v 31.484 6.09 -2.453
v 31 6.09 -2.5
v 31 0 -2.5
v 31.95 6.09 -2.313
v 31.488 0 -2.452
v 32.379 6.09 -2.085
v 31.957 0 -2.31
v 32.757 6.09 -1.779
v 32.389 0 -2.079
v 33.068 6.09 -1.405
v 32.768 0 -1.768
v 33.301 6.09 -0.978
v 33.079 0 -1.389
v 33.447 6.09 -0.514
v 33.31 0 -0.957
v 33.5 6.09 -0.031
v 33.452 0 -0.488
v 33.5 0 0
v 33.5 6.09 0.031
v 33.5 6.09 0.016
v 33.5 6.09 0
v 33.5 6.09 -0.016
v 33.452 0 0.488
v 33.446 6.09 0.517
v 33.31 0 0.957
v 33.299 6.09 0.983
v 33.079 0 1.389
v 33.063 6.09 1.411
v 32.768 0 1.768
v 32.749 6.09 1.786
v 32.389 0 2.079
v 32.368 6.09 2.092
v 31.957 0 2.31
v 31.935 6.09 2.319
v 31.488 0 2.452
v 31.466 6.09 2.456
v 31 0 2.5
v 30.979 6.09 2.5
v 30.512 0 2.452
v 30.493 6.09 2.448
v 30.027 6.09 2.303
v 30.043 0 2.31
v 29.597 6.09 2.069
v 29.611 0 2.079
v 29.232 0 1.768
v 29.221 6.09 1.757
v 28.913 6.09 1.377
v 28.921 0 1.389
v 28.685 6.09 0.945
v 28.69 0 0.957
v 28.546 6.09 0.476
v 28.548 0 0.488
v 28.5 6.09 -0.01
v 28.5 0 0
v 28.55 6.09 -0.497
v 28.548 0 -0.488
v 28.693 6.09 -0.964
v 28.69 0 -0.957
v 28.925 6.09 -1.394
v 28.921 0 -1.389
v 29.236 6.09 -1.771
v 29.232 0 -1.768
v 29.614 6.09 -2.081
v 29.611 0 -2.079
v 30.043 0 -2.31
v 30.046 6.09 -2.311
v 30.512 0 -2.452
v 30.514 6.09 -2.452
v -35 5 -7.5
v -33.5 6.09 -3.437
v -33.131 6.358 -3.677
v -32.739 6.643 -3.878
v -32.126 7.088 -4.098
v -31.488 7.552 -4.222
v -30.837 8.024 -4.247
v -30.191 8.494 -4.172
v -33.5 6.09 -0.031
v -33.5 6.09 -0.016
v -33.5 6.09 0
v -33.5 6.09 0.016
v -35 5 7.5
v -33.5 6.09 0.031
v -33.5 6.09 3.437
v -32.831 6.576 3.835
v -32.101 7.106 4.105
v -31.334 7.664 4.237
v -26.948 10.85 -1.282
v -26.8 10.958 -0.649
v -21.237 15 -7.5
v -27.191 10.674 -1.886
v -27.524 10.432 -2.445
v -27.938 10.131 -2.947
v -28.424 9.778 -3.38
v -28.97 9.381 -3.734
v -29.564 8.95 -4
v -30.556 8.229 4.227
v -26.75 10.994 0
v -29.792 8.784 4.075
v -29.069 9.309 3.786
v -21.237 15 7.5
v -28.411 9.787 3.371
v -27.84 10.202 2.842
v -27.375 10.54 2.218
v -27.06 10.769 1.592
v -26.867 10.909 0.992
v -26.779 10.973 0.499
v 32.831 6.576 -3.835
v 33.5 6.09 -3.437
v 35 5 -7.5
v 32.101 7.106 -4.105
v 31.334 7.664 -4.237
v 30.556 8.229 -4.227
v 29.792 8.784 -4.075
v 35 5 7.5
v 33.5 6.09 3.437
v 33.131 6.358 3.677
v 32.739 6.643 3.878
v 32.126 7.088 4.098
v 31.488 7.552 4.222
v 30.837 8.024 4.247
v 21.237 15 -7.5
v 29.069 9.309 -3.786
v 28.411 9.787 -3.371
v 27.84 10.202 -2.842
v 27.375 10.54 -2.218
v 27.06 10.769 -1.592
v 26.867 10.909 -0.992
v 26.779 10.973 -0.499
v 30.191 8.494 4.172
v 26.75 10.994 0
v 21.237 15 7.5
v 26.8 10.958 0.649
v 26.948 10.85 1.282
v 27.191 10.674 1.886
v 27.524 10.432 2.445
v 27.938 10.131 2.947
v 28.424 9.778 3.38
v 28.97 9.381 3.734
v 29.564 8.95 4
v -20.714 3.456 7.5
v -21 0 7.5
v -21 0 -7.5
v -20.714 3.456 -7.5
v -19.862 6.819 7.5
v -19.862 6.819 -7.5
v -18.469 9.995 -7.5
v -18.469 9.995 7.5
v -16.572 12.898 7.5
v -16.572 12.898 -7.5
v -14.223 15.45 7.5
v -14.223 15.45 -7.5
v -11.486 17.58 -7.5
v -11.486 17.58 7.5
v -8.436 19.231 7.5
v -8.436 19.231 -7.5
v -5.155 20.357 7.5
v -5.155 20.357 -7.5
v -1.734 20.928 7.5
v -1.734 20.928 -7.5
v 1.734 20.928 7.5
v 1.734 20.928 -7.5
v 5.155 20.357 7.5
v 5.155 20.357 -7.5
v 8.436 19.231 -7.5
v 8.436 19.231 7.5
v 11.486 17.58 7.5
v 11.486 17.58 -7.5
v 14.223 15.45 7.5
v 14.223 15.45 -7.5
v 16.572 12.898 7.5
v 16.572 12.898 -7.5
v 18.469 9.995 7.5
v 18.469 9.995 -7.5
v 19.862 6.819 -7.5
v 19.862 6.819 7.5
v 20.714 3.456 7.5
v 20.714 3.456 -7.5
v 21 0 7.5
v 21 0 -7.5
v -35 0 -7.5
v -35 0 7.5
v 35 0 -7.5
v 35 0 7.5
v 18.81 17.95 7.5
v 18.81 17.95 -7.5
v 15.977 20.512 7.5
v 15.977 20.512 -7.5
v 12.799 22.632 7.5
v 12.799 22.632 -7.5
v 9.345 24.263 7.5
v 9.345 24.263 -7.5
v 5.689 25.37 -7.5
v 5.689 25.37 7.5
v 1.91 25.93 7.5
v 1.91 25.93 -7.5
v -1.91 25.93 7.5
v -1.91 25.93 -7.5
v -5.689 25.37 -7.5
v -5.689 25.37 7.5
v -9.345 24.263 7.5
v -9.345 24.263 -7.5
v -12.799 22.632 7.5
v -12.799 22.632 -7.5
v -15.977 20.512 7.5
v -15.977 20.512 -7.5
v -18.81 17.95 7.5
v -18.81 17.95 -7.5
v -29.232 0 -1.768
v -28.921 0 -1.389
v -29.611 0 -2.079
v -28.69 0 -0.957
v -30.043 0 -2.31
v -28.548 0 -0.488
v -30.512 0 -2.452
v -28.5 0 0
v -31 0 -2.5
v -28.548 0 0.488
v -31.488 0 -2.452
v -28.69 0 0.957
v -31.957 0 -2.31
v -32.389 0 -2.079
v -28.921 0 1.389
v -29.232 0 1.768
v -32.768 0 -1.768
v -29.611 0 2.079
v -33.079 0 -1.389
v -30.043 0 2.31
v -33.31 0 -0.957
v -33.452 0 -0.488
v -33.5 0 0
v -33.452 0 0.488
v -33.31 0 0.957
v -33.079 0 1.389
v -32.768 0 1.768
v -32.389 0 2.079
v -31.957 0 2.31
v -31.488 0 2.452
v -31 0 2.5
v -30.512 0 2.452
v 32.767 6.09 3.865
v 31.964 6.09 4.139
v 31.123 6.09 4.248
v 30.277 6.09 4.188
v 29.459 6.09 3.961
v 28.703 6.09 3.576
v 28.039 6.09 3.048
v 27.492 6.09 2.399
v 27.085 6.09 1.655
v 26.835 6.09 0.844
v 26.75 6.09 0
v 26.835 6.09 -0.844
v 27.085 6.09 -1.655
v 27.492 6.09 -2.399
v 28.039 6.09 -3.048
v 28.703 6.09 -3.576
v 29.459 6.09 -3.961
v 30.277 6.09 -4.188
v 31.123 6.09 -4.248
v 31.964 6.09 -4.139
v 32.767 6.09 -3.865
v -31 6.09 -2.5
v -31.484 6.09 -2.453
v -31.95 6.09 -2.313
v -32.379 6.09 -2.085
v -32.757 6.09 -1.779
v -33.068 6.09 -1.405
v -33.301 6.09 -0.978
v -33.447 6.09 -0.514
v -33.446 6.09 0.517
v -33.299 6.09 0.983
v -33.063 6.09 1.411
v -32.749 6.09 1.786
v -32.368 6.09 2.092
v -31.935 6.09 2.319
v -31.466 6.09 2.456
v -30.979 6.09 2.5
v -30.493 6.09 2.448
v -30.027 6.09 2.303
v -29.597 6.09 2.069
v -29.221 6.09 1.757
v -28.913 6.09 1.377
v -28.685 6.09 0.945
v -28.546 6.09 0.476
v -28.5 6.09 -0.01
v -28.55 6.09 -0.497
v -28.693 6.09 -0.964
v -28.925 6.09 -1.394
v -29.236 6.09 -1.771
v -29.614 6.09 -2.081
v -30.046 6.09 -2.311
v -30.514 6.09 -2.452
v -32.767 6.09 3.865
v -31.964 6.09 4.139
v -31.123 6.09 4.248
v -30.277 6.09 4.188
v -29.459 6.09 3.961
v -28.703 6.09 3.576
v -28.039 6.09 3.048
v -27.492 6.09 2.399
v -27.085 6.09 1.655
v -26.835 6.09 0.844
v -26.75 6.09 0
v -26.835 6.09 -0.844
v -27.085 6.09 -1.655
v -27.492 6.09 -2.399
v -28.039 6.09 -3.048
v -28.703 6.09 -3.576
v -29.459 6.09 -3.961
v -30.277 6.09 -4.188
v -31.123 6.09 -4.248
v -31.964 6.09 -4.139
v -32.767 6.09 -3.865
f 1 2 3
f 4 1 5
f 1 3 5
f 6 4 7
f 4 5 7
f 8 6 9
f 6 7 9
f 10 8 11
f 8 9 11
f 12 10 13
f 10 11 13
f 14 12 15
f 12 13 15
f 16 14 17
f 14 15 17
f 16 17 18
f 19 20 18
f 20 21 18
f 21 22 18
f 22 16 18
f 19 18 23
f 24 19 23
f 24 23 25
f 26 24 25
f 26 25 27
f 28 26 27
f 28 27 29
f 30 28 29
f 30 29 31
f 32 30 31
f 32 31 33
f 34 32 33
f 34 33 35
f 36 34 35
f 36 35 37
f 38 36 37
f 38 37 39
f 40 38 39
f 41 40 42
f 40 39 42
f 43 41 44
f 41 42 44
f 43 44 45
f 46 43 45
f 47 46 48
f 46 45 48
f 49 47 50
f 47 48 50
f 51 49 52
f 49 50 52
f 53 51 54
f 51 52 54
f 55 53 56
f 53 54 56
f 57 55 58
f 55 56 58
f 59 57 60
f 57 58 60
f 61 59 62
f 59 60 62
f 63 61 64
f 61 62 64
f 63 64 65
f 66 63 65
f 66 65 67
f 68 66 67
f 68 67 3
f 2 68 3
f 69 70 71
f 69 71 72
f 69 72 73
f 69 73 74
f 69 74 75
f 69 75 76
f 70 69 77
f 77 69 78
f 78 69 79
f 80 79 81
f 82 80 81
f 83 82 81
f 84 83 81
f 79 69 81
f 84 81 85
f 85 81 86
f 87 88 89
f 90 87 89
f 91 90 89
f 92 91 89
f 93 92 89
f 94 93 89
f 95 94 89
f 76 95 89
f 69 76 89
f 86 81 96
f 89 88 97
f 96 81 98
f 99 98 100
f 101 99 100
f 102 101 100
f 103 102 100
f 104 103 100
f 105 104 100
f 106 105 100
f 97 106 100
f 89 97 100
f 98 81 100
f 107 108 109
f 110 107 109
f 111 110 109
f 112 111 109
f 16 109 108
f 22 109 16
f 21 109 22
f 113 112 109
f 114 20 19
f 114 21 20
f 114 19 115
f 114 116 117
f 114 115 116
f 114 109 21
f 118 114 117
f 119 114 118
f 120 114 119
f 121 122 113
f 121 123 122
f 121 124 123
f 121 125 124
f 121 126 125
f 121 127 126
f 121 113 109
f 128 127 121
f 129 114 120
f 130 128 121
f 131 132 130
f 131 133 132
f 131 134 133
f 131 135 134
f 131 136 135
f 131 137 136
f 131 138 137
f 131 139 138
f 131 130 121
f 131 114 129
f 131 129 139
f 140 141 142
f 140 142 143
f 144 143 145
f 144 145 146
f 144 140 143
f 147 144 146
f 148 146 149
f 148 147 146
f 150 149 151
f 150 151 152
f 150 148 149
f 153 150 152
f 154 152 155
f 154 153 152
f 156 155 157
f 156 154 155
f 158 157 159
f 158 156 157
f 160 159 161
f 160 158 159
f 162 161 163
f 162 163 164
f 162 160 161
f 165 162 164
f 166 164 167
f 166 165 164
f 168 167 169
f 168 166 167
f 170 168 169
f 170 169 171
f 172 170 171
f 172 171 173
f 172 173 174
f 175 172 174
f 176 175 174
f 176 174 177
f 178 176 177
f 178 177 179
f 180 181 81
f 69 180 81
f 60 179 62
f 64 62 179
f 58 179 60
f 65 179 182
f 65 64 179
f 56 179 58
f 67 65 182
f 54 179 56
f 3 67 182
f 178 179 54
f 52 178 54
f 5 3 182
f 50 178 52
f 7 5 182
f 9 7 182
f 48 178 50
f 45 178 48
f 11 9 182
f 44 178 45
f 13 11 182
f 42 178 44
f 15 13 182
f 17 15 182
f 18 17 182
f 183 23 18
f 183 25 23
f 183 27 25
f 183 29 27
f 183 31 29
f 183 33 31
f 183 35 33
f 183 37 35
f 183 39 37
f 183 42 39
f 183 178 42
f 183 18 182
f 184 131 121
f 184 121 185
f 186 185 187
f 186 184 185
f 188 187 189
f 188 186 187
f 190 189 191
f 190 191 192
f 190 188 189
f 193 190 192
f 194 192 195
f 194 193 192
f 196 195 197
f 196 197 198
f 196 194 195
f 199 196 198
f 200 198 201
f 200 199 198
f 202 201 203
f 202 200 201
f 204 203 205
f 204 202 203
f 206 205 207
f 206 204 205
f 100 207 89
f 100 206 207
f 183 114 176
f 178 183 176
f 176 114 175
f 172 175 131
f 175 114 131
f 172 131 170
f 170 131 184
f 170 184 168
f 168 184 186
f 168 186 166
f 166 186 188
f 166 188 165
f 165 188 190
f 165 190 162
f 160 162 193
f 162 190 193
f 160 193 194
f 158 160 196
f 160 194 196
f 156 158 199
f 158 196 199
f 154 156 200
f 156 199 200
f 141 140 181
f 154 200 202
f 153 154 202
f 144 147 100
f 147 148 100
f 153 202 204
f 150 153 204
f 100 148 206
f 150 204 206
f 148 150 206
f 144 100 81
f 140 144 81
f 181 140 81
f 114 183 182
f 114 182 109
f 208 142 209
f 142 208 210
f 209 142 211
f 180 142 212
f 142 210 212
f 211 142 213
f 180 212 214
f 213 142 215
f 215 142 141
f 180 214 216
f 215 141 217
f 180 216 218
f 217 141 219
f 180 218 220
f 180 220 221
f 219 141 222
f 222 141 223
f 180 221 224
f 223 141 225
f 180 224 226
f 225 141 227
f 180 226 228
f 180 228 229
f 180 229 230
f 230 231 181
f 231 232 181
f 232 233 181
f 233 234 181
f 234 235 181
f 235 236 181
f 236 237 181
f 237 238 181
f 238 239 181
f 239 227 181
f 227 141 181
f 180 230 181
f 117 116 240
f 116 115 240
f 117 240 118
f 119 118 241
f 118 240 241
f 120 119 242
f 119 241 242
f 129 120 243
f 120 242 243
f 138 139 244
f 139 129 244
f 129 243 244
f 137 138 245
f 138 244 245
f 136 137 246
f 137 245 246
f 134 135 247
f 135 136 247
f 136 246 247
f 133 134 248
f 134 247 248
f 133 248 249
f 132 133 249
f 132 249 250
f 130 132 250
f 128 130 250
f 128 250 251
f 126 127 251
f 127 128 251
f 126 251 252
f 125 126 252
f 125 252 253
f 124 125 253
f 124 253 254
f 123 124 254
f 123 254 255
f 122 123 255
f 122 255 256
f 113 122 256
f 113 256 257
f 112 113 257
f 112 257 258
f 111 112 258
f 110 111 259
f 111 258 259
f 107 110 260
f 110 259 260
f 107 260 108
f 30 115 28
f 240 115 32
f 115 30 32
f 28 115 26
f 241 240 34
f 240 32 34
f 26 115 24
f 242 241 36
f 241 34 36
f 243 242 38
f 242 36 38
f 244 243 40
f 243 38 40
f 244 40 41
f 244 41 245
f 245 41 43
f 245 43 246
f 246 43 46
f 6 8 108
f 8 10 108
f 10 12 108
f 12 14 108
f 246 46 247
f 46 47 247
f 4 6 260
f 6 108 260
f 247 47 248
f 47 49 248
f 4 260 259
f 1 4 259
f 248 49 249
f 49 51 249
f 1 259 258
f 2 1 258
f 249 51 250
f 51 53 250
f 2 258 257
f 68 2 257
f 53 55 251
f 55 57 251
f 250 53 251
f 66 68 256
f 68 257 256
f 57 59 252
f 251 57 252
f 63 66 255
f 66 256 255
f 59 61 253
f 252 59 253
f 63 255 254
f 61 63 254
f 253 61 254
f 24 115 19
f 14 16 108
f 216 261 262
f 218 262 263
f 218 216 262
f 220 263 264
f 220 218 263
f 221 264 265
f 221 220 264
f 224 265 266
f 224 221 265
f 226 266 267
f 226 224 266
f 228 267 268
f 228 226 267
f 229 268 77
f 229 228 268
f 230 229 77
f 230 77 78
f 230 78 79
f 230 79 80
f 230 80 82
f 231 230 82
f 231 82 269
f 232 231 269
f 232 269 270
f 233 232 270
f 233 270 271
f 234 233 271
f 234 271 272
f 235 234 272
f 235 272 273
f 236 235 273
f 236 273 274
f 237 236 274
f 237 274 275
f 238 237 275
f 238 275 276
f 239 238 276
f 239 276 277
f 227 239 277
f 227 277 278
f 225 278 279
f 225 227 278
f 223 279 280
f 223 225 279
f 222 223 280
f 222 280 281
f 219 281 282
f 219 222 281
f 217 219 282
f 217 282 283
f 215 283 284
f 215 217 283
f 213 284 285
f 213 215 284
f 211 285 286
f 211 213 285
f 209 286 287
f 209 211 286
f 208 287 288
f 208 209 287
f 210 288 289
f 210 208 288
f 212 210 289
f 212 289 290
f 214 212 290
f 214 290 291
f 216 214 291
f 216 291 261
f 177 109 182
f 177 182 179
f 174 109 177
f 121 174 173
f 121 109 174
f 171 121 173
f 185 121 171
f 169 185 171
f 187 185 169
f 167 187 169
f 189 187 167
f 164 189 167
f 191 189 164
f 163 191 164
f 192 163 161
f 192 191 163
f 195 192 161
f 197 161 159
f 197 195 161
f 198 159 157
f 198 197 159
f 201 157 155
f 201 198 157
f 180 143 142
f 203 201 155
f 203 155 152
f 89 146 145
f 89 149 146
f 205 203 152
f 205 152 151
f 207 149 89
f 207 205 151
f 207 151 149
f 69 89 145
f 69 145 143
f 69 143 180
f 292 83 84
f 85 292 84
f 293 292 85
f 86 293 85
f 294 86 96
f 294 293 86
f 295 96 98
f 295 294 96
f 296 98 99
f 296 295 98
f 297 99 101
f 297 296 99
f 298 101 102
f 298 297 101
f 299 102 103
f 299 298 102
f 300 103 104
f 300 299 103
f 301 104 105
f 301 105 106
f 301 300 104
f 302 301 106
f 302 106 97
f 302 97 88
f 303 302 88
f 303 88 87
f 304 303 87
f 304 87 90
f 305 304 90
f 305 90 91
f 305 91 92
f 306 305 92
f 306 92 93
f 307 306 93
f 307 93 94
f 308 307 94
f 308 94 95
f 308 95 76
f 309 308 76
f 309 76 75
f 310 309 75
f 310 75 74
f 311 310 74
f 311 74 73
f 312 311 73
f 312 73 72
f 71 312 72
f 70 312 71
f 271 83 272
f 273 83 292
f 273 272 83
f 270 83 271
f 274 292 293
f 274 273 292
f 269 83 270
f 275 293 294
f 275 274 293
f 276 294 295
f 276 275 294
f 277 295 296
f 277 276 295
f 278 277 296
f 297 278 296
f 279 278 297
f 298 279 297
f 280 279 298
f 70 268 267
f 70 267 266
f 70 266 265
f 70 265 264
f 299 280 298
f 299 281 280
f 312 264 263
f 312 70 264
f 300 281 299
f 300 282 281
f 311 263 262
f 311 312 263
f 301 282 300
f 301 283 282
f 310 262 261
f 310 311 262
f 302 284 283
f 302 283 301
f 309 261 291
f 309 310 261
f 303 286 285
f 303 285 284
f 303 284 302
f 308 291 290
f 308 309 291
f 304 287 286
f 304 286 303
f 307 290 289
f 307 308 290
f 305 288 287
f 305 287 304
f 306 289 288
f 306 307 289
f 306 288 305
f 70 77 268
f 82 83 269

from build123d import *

# Parameters (mm, degrees)
SALIENTE_EXTRUIR1_DEPTH = 7.5
SALIENTE_EXTRUIR2_DEPTH = 7.5
CROQUIS3_R              = 2.5
CORTAR_EXTRUIR1_DEPTH   = 45.240818256
CROQUIS4_R              = 4.25
CORTAR_EXTRUIR2_DEPTH   = 41.959224846


with BuildPart() as part:
    # Croquis1 → Saliente-Extruir1 (new, symmetric)
    with BuildSketch(Plane.XY):
        with BuildLine():
            Line((-26, 0), (-21, 0))
            ThreePointArc((-21, 0), (0, 21), (21, 0))
            Line((21, 0), (26, 0))
            ThreePointArc((26, 0), (0, 26), (-26, 0))
        make_face()
    extrude(amount=SALIENTE_EXTRUIR1_DEPTH, both=True)

    # Croquis2 → Saliente-Extruir2 (add, symmetric)
    with BuildSketch(Plane.XY):
        with BuildLine():
            Line((26, 0), (35, 0))
            Line((35, 0), (35, 5))
            Line((35, 5), (21.236760582, 15))
            ThreePointArc((21.236760582, 15), (24.78059498, 7.869060455), (26, 0))
        make_face()
    saliente_extruir2 = extrude(amount=SALIENTE_EXTRUIR2_DEPTH, both=True)

    # Croquis3 → Cortar-Extruir1 (cut, through all)
    with BuildSketch(Plane.XZ):
        with Locations(Location((31, 0, 0), (0, 0, 270))):
            Circle(CROQUIS3_R)
    cortar_extruir1 = extrude(amount=-CORTAR_EXTRUIR1_DEPTH, mode=Mode.SUBTRACT)

    # Croquis4 → Cortar-Extruir2 (cut, through all)
    with BuildSketch(Plane(origin=(0, 6.09, 0), x_dir=(-1, 0, 0), z_dir=(0, -1, 0))):
        with Locations((-31, 0)):
            Circle(CROQUIS4_R)
    cortar_extruir2 = extrude(amount=-CORTAR_EXTRUIR2_DEPTH, mode=Mode.SUBTRACT)

    # Simetría1: Saliente-Extruir2, Cortar-Extruir1, Cortar-Extruir2 across plane
    add(saliente_extruir2.mirror(Plane(origin=(0, 0, 0), x_dir=(0, 0, 1), z_dir=(1, 0, 0))))
    add(cortar_extruir1.mirror(Plane(origin=(0, 0, 0), x_dir=(0, 0, 1), z_dir=(1, 0, 0))), mode=Mode.SUBTRACT)
    add(cortar_extruir2.mirror(Plane(origin=(0, 0, 0), x_dir=(0, 0, 1), z_dir=(1, 0, 0))), mode=Mode.SUBTRACT)


solid = part.part
